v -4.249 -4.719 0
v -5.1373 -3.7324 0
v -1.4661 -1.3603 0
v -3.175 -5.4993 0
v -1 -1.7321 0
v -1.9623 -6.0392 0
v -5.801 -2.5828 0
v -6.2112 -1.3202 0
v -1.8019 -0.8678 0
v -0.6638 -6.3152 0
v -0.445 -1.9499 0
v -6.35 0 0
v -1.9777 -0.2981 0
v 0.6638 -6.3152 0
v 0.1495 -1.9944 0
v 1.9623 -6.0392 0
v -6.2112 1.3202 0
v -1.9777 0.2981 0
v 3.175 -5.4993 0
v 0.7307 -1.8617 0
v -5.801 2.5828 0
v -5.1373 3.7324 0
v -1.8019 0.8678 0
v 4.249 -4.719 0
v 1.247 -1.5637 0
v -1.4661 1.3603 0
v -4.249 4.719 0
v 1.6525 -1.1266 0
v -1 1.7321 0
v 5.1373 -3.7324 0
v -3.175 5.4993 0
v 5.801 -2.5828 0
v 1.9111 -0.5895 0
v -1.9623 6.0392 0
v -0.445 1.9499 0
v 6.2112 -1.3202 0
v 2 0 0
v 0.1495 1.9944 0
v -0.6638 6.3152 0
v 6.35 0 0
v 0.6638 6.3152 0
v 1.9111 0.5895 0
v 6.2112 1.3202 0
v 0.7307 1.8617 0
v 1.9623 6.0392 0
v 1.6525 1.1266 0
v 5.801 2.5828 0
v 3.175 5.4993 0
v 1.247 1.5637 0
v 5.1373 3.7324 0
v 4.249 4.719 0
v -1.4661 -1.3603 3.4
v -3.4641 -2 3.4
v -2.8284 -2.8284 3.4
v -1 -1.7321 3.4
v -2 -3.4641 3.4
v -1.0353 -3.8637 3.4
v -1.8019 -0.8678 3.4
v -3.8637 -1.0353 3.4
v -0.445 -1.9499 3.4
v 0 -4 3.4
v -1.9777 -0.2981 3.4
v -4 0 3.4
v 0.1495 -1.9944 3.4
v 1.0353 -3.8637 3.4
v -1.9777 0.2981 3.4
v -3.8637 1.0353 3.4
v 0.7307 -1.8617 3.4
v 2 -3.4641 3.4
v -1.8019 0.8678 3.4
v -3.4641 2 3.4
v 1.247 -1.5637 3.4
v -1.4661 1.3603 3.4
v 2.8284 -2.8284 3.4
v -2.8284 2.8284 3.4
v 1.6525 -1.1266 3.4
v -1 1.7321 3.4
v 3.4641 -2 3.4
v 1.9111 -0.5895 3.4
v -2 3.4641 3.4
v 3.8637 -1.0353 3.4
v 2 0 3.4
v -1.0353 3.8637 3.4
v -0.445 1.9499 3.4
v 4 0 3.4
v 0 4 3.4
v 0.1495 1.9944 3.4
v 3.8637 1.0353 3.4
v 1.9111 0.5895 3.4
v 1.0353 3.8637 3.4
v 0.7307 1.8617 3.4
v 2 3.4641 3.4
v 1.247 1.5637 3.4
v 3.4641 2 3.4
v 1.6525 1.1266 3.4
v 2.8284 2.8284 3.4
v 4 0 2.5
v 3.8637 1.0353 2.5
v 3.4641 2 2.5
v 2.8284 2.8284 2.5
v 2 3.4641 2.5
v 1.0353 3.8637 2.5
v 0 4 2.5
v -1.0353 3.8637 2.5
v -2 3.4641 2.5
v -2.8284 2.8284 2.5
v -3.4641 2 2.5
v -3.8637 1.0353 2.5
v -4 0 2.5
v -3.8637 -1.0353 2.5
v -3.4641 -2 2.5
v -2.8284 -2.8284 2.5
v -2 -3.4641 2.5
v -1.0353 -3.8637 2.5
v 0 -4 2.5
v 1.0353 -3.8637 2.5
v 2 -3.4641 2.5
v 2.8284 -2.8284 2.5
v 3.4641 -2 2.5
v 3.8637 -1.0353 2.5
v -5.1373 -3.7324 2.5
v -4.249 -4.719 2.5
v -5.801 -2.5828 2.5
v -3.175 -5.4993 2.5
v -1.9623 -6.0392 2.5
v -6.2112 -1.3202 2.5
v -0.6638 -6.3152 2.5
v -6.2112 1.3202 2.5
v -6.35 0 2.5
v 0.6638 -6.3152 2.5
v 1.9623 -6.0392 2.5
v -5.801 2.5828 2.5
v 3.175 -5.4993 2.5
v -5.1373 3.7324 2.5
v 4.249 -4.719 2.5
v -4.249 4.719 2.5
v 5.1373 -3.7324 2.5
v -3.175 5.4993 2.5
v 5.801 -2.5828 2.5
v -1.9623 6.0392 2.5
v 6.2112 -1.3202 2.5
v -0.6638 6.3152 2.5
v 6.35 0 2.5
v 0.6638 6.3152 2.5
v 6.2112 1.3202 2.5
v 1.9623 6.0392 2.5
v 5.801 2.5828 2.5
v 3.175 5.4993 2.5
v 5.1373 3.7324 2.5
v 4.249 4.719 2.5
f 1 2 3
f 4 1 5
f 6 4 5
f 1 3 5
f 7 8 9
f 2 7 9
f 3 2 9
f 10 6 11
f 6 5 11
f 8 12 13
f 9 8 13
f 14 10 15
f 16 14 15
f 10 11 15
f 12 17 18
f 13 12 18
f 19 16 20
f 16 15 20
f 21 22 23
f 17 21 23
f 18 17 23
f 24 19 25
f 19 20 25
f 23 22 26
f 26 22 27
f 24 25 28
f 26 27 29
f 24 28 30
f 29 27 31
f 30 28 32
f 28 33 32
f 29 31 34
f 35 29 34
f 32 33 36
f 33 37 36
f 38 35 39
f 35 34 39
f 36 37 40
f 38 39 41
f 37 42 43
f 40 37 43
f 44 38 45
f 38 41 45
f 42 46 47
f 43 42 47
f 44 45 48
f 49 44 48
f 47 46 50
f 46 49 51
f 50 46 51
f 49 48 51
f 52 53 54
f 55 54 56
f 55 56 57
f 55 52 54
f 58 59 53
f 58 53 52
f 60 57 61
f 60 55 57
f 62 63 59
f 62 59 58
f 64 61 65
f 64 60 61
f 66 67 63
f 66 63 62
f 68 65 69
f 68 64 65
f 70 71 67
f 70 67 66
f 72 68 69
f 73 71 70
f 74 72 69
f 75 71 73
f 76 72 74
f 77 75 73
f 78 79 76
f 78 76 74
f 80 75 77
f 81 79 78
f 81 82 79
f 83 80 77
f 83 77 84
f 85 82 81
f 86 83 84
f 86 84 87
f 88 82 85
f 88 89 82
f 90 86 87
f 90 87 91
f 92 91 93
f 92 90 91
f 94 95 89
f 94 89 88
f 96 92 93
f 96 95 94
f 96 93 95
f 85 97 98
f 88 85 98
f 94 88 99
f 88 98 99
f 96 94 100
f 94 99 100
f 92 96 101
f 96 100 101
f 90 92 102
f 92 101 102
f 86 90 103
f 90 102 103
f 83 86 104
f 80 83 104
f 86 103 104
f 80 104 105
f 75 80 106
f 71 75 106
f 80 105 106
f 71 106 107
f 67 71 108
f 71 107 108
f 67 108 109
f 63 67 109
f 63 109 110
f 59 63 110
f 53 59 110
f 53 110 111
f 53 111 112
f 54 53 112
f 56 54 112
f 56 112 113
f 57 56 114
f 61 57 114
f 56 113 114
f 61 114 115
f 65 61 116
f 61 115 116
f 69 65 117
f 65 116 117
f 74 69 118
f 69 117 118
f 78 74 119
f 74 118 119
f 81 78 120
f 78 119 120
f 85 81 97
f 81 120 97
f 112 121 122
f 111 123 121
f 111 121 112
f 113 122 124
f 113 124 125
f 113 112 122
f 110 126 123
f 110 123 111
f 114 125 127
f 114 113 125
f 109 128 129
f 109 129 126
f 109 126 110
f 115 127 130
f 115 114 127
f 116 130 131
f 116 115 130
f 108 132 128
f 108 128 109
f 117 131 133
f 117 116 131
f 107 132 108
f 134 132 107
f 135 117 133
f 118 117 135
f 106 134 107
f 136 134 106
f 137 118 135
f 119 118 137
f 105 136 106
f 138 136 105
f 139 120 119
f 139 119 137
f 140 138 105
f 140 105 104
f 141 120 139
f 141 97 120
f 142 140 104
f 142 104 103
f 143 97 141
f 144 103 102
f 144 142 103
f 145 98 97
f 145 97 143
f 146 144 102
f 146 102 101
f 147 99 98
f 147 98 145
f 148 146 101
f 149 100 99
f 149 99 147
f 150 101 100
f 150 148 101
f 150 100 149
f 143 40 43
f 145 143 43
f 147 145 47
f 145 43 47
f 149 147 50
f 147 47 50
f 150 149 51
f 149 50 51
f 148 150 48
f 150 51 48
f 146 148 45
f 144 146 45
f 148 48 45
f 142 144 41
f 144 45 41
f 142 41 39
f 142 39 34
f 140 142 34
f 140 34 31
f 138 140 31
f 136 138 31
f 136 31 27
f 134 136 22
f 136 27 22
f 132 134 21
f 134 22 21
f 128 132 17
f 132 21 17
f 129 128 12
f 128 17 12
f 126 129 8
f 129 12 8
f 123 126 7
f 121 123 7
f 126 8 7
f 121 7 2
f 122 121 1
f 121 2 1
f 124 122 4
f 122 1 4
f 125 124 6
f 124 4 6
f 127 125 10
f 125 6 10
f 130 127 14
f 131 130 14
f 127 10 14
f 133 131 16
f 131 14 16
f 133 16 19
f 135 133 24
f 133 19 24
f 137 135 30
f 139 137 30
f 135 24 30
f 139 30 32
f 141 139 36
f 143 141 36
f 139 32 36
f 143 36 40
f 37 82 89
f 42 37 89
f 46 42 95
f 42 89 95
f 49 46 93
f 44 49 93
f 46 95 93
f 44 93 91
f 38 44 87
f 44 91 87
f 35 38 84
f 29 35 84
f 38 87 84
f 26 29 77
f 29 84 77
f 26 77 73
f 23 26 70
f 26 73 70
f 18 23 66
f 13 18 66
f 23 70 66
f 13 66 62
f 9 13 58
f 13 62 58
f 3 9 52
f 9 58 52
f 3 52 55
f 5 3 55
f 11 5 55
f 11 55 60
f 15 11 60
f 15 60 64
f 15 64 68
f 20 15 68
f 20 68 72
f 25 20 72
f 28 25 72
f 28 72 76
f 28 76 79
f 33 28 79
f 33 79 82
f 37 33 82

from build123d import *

# Parameters (mm, degrees)
F0_R     = 6.35
F1_DEPTH = 2.5
F2_R     = 4
F3_DEPTH = 0.9
F4_R     = 2
F5_DEPTH = 3.401


with BuildPart() as f1:
    # F0 (on Top) → F1 (new body)
    with BuildSketch(Plane.XY):
        Circle(F0_R)
    extrude(amount=F1_DEPTH)

    # F2 (on face) → F3 (join)
    with BuildSketch(Plane.XY.offset(2.5)):
        Circle(F2_R)
    extrude(amount=F3_DEPTH)

    # F4 (on face) → F5 (cut, through all)
    with BuildSketch(Plane.XY.offset(3.4)):
        Circle(F4_R)
    extrude(amount=-F5_DEPTH, mode=Mode.SUBTRACT)


solid = f1.part
